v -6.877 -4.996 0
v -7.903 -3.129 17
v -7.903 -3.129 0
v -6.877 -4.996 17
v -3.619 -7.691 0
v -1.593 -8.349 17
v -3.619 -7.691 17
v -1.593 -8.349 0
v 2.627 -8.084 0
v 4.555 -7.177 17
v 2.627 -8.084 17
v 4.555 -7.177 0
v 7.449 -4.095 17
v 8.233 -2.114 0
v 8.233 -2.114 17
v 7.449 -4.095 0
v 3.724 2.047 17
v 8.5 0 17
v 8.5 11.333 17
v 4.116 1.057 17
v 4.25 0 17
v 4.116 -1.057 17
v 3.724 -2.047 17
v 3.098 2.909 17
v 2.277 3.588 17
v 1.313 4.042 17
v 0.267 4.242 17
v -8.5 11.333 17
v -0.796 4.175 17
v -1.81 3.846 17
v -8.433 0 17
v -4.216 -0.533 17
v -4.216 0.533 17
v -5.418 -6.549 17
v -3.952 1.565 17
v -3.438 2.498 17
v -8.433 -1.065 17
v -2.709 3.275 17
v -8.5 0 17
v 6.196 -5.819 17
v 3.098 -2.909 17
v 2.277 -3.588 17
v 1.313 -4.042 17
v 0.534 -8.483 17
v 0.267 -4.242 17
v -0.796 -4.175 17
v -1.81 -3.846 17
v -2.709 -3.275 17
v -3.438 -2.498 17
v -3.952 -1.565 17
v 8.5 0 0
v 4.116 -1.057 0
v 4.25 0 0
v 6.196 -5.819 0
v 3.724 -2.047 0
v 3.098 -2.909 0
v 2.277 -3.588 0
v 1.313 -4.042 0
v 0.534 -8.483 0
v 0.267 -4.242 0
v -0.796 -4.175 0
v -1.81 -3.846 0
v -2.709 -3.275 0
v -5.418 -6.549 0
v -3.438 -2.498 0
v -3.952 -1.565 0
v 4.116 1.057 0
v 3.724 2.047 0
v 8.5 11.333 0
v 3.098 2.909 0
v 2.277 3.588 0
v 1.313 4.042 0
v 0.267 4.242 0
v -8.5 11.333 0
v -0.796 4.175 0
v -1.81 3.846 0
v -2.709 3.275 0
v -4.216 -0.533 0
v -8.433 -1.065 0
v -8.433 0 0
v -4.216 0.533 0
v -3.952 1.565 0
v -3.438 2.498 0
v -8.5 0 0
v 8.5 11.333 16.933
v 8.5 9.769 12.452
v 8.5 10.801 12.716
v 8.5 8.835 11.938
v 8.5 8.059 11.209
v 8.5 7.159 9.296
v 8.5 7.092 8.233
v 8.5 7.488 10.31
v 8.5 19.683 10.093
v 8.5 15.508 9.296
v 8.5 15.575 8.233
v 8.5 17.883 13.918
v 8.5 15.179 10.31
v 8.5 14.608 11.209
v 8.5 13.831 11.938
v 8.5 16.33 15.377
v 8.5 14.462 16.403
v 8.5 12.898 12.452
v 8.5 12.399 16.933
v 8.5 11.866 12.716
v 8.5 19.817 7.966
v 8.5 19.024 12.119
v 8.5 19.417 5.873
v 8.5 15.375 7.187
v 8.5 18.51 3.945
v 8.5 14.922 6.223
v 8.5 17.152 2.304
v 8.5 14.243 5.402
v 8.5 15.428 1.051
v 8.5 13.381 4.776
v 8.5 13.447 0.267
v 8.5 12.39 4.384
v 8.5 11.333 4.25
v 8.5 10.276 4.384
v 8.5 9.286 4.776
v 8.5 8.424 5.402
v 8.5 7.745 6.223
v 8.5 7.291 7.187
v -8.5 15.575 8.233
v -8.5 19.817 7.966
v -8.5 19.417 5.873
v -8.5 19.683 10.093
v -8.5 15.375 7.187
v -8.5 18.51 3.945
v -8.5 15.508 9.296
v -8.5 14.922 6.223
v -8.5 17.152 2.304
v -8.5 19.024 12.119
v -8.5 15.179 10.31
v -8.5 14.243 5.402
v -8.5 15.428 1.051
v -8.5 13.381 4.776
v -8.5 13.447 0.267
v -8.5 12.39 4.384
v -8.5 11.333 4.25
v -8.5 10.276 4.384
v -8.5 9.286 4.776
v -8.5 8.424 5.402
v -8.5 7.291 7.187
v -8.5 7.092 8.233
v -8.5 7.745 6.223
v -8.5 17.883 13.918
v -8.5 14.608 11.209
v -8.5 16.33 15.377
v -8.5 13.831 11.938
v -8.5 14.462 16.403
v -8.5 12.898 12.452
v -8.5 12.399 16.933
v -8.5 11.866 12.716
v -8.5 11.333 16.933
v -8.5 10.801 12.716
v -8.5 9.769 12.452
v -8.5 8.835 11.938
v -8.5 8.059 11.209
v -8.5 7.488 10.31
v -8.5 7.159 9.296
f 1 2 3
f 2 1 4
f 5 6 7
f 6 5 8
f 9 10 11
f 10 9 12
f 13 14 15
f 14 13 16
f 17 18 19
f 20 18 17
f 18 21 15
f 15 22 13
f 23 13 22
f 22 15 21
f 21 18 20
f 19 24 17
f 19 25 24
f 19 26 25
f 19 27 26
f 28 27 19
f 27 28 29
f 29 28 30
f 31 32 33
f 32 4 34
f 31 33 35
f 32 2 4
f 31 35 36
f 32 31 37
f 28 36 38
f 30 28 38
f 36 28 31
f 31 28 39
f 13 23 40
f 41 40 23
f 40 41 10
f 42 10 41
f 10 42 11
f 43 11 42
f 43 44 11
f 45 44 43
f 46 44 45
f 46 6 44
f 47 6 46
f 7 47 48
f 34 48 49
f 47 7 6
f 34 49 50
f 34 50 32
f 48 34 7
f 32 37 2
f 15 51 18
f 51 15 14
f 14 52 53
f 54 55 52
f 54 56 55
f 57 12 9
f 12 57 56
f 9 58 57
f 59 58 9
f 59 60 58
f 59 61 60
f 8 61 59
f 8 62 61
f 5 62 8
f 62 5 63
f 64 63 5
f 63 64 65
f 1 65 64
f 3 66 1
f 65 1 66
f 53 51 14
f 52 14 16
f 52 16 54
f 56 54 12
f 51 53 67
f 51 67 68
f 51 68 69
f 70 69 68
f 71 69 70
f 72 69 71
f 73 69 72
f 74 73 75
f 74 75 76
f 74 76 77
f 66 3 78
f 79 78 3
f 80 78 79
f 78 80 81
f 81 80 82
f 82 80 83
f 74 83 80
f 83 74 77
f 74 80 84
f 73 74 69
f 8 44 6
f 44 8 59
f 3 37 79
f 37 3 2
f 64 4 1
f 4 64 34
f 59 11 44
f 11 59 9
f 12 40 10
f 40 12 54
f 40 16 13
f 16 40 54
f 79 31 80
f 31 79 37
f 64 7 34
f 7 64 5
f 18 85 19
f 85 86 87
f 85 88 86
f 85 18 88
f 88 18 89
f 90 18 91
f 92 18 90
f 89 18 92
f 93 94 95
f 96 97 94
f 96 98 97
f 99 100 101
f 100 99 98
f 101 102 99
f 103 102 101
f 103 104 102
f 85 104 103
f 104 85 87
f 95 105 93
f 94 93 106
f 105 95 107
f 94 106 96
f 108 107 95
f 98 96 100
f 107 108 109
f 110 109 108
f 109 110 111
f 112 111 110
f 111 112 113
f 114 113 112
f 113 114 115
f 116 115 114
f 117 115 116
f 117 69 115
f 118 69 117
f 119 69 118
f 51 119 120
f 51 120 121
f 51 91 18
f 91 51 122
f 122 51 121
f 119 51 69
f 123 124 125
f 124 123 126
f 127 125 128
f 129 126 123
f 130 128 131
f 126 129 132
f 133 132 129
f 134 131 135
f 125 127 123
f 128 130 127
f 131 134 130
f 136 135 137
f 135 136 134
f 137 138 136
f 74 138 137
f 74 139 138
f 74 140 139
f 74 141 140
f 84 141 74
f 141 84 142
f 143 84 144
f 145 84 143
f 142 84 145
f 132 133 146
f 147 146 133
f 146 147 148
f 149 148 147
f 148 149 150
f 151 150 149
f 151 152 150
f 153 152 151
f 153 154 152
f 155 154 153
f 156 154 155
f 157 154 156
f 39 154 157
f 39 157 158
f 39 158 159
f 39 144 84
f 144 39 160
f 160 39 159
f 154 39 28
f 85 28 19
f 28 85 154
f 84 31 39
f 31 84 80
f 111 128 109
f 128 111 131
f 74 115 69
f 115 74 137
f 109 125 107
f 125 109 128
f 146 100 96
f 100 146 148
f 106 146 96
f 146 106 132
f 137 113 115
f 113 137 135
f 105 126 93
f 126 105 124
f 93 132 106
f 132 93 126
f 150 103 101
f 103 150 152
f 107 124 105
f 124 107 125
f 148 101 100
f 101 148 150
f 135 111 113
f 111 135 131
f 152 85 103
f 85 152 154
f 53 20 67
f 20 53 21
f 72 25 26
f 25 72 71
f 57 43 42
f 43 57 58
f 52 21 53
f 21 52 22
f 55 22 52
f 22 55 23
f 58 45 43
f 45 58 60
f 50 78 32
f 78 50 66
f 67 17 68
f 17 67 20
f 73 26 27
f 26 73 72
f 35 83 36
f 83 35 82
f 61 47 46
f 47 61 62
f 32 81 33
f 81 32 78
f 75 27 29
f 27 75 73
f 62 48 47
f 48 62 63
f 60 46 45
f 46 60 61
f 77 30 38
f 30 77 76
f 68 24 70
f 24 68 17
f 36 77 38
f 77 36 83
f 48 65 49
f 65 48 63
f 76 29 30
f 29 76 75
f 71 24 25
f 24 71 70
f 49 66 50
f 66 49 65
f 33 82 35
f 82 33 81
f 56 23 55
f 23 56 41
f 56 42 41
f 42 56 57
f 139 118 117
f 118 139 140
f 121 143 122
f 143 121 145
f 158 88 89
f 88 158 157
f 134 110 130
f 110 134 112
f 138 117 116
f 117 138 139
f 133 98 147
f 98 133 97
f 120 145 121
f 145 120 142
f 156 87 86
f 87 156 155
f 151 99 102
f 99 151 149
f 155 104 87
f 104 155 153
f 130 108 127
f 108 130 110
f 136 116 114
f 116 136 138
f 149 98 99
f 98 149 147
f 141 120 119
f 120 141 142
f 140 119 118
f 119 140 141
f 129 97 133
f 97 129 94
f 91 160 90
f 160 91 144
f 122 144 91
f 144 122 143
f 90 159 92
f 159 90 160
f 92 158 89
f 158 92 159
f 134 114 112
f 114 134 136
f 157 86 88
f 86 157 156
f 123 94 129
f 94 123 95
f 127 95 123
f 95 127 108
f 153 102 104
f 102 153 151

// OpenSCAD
$fn = 25;

stud_clear_dia = 8.5;
washer_dia = 17;
thk = washer_dia;

module hollow_cylinder(id,od,height)
{
    difference()
    {
        cylinder(d=od,h=height);
        cylinder(d=id,h=height);
    }
    
}

//outers
difference()
{
    union()
    {
        //vertical cylinder
        cylinder(d=washer_dia,h=thk);
        
        //middle block
        translate([-washer_dia/2,0,0])
            cube([washer_dia,washer_dia*(2/3),washer_dia]);
        
     //horizontal cylinder   
        translate([-thk/2,washer_dia*(2/3),thk/2])
            rotate([0,90,0])
                cylinder(d=washer_dia,h=thk);
    }

//holes
cylinder(d=stud_clear_dia,h=thk);
translate([-thk/2,washer_dia*(2/3),thk/2])
    rotate([0,90,0])
        cylinder(d=stud_clear_dia,h=thk);
}
/*
hollow_cylinder(id=stud_clear_dia, od=washer_dia, height=thk);
translate([-thk/2,washer_dia*(2/3),thk/2])
    rotate([0,90,0])
        hollow_cylinder(id=stud_clear_dia, od=washer_dia, height=thk);
*/
    
